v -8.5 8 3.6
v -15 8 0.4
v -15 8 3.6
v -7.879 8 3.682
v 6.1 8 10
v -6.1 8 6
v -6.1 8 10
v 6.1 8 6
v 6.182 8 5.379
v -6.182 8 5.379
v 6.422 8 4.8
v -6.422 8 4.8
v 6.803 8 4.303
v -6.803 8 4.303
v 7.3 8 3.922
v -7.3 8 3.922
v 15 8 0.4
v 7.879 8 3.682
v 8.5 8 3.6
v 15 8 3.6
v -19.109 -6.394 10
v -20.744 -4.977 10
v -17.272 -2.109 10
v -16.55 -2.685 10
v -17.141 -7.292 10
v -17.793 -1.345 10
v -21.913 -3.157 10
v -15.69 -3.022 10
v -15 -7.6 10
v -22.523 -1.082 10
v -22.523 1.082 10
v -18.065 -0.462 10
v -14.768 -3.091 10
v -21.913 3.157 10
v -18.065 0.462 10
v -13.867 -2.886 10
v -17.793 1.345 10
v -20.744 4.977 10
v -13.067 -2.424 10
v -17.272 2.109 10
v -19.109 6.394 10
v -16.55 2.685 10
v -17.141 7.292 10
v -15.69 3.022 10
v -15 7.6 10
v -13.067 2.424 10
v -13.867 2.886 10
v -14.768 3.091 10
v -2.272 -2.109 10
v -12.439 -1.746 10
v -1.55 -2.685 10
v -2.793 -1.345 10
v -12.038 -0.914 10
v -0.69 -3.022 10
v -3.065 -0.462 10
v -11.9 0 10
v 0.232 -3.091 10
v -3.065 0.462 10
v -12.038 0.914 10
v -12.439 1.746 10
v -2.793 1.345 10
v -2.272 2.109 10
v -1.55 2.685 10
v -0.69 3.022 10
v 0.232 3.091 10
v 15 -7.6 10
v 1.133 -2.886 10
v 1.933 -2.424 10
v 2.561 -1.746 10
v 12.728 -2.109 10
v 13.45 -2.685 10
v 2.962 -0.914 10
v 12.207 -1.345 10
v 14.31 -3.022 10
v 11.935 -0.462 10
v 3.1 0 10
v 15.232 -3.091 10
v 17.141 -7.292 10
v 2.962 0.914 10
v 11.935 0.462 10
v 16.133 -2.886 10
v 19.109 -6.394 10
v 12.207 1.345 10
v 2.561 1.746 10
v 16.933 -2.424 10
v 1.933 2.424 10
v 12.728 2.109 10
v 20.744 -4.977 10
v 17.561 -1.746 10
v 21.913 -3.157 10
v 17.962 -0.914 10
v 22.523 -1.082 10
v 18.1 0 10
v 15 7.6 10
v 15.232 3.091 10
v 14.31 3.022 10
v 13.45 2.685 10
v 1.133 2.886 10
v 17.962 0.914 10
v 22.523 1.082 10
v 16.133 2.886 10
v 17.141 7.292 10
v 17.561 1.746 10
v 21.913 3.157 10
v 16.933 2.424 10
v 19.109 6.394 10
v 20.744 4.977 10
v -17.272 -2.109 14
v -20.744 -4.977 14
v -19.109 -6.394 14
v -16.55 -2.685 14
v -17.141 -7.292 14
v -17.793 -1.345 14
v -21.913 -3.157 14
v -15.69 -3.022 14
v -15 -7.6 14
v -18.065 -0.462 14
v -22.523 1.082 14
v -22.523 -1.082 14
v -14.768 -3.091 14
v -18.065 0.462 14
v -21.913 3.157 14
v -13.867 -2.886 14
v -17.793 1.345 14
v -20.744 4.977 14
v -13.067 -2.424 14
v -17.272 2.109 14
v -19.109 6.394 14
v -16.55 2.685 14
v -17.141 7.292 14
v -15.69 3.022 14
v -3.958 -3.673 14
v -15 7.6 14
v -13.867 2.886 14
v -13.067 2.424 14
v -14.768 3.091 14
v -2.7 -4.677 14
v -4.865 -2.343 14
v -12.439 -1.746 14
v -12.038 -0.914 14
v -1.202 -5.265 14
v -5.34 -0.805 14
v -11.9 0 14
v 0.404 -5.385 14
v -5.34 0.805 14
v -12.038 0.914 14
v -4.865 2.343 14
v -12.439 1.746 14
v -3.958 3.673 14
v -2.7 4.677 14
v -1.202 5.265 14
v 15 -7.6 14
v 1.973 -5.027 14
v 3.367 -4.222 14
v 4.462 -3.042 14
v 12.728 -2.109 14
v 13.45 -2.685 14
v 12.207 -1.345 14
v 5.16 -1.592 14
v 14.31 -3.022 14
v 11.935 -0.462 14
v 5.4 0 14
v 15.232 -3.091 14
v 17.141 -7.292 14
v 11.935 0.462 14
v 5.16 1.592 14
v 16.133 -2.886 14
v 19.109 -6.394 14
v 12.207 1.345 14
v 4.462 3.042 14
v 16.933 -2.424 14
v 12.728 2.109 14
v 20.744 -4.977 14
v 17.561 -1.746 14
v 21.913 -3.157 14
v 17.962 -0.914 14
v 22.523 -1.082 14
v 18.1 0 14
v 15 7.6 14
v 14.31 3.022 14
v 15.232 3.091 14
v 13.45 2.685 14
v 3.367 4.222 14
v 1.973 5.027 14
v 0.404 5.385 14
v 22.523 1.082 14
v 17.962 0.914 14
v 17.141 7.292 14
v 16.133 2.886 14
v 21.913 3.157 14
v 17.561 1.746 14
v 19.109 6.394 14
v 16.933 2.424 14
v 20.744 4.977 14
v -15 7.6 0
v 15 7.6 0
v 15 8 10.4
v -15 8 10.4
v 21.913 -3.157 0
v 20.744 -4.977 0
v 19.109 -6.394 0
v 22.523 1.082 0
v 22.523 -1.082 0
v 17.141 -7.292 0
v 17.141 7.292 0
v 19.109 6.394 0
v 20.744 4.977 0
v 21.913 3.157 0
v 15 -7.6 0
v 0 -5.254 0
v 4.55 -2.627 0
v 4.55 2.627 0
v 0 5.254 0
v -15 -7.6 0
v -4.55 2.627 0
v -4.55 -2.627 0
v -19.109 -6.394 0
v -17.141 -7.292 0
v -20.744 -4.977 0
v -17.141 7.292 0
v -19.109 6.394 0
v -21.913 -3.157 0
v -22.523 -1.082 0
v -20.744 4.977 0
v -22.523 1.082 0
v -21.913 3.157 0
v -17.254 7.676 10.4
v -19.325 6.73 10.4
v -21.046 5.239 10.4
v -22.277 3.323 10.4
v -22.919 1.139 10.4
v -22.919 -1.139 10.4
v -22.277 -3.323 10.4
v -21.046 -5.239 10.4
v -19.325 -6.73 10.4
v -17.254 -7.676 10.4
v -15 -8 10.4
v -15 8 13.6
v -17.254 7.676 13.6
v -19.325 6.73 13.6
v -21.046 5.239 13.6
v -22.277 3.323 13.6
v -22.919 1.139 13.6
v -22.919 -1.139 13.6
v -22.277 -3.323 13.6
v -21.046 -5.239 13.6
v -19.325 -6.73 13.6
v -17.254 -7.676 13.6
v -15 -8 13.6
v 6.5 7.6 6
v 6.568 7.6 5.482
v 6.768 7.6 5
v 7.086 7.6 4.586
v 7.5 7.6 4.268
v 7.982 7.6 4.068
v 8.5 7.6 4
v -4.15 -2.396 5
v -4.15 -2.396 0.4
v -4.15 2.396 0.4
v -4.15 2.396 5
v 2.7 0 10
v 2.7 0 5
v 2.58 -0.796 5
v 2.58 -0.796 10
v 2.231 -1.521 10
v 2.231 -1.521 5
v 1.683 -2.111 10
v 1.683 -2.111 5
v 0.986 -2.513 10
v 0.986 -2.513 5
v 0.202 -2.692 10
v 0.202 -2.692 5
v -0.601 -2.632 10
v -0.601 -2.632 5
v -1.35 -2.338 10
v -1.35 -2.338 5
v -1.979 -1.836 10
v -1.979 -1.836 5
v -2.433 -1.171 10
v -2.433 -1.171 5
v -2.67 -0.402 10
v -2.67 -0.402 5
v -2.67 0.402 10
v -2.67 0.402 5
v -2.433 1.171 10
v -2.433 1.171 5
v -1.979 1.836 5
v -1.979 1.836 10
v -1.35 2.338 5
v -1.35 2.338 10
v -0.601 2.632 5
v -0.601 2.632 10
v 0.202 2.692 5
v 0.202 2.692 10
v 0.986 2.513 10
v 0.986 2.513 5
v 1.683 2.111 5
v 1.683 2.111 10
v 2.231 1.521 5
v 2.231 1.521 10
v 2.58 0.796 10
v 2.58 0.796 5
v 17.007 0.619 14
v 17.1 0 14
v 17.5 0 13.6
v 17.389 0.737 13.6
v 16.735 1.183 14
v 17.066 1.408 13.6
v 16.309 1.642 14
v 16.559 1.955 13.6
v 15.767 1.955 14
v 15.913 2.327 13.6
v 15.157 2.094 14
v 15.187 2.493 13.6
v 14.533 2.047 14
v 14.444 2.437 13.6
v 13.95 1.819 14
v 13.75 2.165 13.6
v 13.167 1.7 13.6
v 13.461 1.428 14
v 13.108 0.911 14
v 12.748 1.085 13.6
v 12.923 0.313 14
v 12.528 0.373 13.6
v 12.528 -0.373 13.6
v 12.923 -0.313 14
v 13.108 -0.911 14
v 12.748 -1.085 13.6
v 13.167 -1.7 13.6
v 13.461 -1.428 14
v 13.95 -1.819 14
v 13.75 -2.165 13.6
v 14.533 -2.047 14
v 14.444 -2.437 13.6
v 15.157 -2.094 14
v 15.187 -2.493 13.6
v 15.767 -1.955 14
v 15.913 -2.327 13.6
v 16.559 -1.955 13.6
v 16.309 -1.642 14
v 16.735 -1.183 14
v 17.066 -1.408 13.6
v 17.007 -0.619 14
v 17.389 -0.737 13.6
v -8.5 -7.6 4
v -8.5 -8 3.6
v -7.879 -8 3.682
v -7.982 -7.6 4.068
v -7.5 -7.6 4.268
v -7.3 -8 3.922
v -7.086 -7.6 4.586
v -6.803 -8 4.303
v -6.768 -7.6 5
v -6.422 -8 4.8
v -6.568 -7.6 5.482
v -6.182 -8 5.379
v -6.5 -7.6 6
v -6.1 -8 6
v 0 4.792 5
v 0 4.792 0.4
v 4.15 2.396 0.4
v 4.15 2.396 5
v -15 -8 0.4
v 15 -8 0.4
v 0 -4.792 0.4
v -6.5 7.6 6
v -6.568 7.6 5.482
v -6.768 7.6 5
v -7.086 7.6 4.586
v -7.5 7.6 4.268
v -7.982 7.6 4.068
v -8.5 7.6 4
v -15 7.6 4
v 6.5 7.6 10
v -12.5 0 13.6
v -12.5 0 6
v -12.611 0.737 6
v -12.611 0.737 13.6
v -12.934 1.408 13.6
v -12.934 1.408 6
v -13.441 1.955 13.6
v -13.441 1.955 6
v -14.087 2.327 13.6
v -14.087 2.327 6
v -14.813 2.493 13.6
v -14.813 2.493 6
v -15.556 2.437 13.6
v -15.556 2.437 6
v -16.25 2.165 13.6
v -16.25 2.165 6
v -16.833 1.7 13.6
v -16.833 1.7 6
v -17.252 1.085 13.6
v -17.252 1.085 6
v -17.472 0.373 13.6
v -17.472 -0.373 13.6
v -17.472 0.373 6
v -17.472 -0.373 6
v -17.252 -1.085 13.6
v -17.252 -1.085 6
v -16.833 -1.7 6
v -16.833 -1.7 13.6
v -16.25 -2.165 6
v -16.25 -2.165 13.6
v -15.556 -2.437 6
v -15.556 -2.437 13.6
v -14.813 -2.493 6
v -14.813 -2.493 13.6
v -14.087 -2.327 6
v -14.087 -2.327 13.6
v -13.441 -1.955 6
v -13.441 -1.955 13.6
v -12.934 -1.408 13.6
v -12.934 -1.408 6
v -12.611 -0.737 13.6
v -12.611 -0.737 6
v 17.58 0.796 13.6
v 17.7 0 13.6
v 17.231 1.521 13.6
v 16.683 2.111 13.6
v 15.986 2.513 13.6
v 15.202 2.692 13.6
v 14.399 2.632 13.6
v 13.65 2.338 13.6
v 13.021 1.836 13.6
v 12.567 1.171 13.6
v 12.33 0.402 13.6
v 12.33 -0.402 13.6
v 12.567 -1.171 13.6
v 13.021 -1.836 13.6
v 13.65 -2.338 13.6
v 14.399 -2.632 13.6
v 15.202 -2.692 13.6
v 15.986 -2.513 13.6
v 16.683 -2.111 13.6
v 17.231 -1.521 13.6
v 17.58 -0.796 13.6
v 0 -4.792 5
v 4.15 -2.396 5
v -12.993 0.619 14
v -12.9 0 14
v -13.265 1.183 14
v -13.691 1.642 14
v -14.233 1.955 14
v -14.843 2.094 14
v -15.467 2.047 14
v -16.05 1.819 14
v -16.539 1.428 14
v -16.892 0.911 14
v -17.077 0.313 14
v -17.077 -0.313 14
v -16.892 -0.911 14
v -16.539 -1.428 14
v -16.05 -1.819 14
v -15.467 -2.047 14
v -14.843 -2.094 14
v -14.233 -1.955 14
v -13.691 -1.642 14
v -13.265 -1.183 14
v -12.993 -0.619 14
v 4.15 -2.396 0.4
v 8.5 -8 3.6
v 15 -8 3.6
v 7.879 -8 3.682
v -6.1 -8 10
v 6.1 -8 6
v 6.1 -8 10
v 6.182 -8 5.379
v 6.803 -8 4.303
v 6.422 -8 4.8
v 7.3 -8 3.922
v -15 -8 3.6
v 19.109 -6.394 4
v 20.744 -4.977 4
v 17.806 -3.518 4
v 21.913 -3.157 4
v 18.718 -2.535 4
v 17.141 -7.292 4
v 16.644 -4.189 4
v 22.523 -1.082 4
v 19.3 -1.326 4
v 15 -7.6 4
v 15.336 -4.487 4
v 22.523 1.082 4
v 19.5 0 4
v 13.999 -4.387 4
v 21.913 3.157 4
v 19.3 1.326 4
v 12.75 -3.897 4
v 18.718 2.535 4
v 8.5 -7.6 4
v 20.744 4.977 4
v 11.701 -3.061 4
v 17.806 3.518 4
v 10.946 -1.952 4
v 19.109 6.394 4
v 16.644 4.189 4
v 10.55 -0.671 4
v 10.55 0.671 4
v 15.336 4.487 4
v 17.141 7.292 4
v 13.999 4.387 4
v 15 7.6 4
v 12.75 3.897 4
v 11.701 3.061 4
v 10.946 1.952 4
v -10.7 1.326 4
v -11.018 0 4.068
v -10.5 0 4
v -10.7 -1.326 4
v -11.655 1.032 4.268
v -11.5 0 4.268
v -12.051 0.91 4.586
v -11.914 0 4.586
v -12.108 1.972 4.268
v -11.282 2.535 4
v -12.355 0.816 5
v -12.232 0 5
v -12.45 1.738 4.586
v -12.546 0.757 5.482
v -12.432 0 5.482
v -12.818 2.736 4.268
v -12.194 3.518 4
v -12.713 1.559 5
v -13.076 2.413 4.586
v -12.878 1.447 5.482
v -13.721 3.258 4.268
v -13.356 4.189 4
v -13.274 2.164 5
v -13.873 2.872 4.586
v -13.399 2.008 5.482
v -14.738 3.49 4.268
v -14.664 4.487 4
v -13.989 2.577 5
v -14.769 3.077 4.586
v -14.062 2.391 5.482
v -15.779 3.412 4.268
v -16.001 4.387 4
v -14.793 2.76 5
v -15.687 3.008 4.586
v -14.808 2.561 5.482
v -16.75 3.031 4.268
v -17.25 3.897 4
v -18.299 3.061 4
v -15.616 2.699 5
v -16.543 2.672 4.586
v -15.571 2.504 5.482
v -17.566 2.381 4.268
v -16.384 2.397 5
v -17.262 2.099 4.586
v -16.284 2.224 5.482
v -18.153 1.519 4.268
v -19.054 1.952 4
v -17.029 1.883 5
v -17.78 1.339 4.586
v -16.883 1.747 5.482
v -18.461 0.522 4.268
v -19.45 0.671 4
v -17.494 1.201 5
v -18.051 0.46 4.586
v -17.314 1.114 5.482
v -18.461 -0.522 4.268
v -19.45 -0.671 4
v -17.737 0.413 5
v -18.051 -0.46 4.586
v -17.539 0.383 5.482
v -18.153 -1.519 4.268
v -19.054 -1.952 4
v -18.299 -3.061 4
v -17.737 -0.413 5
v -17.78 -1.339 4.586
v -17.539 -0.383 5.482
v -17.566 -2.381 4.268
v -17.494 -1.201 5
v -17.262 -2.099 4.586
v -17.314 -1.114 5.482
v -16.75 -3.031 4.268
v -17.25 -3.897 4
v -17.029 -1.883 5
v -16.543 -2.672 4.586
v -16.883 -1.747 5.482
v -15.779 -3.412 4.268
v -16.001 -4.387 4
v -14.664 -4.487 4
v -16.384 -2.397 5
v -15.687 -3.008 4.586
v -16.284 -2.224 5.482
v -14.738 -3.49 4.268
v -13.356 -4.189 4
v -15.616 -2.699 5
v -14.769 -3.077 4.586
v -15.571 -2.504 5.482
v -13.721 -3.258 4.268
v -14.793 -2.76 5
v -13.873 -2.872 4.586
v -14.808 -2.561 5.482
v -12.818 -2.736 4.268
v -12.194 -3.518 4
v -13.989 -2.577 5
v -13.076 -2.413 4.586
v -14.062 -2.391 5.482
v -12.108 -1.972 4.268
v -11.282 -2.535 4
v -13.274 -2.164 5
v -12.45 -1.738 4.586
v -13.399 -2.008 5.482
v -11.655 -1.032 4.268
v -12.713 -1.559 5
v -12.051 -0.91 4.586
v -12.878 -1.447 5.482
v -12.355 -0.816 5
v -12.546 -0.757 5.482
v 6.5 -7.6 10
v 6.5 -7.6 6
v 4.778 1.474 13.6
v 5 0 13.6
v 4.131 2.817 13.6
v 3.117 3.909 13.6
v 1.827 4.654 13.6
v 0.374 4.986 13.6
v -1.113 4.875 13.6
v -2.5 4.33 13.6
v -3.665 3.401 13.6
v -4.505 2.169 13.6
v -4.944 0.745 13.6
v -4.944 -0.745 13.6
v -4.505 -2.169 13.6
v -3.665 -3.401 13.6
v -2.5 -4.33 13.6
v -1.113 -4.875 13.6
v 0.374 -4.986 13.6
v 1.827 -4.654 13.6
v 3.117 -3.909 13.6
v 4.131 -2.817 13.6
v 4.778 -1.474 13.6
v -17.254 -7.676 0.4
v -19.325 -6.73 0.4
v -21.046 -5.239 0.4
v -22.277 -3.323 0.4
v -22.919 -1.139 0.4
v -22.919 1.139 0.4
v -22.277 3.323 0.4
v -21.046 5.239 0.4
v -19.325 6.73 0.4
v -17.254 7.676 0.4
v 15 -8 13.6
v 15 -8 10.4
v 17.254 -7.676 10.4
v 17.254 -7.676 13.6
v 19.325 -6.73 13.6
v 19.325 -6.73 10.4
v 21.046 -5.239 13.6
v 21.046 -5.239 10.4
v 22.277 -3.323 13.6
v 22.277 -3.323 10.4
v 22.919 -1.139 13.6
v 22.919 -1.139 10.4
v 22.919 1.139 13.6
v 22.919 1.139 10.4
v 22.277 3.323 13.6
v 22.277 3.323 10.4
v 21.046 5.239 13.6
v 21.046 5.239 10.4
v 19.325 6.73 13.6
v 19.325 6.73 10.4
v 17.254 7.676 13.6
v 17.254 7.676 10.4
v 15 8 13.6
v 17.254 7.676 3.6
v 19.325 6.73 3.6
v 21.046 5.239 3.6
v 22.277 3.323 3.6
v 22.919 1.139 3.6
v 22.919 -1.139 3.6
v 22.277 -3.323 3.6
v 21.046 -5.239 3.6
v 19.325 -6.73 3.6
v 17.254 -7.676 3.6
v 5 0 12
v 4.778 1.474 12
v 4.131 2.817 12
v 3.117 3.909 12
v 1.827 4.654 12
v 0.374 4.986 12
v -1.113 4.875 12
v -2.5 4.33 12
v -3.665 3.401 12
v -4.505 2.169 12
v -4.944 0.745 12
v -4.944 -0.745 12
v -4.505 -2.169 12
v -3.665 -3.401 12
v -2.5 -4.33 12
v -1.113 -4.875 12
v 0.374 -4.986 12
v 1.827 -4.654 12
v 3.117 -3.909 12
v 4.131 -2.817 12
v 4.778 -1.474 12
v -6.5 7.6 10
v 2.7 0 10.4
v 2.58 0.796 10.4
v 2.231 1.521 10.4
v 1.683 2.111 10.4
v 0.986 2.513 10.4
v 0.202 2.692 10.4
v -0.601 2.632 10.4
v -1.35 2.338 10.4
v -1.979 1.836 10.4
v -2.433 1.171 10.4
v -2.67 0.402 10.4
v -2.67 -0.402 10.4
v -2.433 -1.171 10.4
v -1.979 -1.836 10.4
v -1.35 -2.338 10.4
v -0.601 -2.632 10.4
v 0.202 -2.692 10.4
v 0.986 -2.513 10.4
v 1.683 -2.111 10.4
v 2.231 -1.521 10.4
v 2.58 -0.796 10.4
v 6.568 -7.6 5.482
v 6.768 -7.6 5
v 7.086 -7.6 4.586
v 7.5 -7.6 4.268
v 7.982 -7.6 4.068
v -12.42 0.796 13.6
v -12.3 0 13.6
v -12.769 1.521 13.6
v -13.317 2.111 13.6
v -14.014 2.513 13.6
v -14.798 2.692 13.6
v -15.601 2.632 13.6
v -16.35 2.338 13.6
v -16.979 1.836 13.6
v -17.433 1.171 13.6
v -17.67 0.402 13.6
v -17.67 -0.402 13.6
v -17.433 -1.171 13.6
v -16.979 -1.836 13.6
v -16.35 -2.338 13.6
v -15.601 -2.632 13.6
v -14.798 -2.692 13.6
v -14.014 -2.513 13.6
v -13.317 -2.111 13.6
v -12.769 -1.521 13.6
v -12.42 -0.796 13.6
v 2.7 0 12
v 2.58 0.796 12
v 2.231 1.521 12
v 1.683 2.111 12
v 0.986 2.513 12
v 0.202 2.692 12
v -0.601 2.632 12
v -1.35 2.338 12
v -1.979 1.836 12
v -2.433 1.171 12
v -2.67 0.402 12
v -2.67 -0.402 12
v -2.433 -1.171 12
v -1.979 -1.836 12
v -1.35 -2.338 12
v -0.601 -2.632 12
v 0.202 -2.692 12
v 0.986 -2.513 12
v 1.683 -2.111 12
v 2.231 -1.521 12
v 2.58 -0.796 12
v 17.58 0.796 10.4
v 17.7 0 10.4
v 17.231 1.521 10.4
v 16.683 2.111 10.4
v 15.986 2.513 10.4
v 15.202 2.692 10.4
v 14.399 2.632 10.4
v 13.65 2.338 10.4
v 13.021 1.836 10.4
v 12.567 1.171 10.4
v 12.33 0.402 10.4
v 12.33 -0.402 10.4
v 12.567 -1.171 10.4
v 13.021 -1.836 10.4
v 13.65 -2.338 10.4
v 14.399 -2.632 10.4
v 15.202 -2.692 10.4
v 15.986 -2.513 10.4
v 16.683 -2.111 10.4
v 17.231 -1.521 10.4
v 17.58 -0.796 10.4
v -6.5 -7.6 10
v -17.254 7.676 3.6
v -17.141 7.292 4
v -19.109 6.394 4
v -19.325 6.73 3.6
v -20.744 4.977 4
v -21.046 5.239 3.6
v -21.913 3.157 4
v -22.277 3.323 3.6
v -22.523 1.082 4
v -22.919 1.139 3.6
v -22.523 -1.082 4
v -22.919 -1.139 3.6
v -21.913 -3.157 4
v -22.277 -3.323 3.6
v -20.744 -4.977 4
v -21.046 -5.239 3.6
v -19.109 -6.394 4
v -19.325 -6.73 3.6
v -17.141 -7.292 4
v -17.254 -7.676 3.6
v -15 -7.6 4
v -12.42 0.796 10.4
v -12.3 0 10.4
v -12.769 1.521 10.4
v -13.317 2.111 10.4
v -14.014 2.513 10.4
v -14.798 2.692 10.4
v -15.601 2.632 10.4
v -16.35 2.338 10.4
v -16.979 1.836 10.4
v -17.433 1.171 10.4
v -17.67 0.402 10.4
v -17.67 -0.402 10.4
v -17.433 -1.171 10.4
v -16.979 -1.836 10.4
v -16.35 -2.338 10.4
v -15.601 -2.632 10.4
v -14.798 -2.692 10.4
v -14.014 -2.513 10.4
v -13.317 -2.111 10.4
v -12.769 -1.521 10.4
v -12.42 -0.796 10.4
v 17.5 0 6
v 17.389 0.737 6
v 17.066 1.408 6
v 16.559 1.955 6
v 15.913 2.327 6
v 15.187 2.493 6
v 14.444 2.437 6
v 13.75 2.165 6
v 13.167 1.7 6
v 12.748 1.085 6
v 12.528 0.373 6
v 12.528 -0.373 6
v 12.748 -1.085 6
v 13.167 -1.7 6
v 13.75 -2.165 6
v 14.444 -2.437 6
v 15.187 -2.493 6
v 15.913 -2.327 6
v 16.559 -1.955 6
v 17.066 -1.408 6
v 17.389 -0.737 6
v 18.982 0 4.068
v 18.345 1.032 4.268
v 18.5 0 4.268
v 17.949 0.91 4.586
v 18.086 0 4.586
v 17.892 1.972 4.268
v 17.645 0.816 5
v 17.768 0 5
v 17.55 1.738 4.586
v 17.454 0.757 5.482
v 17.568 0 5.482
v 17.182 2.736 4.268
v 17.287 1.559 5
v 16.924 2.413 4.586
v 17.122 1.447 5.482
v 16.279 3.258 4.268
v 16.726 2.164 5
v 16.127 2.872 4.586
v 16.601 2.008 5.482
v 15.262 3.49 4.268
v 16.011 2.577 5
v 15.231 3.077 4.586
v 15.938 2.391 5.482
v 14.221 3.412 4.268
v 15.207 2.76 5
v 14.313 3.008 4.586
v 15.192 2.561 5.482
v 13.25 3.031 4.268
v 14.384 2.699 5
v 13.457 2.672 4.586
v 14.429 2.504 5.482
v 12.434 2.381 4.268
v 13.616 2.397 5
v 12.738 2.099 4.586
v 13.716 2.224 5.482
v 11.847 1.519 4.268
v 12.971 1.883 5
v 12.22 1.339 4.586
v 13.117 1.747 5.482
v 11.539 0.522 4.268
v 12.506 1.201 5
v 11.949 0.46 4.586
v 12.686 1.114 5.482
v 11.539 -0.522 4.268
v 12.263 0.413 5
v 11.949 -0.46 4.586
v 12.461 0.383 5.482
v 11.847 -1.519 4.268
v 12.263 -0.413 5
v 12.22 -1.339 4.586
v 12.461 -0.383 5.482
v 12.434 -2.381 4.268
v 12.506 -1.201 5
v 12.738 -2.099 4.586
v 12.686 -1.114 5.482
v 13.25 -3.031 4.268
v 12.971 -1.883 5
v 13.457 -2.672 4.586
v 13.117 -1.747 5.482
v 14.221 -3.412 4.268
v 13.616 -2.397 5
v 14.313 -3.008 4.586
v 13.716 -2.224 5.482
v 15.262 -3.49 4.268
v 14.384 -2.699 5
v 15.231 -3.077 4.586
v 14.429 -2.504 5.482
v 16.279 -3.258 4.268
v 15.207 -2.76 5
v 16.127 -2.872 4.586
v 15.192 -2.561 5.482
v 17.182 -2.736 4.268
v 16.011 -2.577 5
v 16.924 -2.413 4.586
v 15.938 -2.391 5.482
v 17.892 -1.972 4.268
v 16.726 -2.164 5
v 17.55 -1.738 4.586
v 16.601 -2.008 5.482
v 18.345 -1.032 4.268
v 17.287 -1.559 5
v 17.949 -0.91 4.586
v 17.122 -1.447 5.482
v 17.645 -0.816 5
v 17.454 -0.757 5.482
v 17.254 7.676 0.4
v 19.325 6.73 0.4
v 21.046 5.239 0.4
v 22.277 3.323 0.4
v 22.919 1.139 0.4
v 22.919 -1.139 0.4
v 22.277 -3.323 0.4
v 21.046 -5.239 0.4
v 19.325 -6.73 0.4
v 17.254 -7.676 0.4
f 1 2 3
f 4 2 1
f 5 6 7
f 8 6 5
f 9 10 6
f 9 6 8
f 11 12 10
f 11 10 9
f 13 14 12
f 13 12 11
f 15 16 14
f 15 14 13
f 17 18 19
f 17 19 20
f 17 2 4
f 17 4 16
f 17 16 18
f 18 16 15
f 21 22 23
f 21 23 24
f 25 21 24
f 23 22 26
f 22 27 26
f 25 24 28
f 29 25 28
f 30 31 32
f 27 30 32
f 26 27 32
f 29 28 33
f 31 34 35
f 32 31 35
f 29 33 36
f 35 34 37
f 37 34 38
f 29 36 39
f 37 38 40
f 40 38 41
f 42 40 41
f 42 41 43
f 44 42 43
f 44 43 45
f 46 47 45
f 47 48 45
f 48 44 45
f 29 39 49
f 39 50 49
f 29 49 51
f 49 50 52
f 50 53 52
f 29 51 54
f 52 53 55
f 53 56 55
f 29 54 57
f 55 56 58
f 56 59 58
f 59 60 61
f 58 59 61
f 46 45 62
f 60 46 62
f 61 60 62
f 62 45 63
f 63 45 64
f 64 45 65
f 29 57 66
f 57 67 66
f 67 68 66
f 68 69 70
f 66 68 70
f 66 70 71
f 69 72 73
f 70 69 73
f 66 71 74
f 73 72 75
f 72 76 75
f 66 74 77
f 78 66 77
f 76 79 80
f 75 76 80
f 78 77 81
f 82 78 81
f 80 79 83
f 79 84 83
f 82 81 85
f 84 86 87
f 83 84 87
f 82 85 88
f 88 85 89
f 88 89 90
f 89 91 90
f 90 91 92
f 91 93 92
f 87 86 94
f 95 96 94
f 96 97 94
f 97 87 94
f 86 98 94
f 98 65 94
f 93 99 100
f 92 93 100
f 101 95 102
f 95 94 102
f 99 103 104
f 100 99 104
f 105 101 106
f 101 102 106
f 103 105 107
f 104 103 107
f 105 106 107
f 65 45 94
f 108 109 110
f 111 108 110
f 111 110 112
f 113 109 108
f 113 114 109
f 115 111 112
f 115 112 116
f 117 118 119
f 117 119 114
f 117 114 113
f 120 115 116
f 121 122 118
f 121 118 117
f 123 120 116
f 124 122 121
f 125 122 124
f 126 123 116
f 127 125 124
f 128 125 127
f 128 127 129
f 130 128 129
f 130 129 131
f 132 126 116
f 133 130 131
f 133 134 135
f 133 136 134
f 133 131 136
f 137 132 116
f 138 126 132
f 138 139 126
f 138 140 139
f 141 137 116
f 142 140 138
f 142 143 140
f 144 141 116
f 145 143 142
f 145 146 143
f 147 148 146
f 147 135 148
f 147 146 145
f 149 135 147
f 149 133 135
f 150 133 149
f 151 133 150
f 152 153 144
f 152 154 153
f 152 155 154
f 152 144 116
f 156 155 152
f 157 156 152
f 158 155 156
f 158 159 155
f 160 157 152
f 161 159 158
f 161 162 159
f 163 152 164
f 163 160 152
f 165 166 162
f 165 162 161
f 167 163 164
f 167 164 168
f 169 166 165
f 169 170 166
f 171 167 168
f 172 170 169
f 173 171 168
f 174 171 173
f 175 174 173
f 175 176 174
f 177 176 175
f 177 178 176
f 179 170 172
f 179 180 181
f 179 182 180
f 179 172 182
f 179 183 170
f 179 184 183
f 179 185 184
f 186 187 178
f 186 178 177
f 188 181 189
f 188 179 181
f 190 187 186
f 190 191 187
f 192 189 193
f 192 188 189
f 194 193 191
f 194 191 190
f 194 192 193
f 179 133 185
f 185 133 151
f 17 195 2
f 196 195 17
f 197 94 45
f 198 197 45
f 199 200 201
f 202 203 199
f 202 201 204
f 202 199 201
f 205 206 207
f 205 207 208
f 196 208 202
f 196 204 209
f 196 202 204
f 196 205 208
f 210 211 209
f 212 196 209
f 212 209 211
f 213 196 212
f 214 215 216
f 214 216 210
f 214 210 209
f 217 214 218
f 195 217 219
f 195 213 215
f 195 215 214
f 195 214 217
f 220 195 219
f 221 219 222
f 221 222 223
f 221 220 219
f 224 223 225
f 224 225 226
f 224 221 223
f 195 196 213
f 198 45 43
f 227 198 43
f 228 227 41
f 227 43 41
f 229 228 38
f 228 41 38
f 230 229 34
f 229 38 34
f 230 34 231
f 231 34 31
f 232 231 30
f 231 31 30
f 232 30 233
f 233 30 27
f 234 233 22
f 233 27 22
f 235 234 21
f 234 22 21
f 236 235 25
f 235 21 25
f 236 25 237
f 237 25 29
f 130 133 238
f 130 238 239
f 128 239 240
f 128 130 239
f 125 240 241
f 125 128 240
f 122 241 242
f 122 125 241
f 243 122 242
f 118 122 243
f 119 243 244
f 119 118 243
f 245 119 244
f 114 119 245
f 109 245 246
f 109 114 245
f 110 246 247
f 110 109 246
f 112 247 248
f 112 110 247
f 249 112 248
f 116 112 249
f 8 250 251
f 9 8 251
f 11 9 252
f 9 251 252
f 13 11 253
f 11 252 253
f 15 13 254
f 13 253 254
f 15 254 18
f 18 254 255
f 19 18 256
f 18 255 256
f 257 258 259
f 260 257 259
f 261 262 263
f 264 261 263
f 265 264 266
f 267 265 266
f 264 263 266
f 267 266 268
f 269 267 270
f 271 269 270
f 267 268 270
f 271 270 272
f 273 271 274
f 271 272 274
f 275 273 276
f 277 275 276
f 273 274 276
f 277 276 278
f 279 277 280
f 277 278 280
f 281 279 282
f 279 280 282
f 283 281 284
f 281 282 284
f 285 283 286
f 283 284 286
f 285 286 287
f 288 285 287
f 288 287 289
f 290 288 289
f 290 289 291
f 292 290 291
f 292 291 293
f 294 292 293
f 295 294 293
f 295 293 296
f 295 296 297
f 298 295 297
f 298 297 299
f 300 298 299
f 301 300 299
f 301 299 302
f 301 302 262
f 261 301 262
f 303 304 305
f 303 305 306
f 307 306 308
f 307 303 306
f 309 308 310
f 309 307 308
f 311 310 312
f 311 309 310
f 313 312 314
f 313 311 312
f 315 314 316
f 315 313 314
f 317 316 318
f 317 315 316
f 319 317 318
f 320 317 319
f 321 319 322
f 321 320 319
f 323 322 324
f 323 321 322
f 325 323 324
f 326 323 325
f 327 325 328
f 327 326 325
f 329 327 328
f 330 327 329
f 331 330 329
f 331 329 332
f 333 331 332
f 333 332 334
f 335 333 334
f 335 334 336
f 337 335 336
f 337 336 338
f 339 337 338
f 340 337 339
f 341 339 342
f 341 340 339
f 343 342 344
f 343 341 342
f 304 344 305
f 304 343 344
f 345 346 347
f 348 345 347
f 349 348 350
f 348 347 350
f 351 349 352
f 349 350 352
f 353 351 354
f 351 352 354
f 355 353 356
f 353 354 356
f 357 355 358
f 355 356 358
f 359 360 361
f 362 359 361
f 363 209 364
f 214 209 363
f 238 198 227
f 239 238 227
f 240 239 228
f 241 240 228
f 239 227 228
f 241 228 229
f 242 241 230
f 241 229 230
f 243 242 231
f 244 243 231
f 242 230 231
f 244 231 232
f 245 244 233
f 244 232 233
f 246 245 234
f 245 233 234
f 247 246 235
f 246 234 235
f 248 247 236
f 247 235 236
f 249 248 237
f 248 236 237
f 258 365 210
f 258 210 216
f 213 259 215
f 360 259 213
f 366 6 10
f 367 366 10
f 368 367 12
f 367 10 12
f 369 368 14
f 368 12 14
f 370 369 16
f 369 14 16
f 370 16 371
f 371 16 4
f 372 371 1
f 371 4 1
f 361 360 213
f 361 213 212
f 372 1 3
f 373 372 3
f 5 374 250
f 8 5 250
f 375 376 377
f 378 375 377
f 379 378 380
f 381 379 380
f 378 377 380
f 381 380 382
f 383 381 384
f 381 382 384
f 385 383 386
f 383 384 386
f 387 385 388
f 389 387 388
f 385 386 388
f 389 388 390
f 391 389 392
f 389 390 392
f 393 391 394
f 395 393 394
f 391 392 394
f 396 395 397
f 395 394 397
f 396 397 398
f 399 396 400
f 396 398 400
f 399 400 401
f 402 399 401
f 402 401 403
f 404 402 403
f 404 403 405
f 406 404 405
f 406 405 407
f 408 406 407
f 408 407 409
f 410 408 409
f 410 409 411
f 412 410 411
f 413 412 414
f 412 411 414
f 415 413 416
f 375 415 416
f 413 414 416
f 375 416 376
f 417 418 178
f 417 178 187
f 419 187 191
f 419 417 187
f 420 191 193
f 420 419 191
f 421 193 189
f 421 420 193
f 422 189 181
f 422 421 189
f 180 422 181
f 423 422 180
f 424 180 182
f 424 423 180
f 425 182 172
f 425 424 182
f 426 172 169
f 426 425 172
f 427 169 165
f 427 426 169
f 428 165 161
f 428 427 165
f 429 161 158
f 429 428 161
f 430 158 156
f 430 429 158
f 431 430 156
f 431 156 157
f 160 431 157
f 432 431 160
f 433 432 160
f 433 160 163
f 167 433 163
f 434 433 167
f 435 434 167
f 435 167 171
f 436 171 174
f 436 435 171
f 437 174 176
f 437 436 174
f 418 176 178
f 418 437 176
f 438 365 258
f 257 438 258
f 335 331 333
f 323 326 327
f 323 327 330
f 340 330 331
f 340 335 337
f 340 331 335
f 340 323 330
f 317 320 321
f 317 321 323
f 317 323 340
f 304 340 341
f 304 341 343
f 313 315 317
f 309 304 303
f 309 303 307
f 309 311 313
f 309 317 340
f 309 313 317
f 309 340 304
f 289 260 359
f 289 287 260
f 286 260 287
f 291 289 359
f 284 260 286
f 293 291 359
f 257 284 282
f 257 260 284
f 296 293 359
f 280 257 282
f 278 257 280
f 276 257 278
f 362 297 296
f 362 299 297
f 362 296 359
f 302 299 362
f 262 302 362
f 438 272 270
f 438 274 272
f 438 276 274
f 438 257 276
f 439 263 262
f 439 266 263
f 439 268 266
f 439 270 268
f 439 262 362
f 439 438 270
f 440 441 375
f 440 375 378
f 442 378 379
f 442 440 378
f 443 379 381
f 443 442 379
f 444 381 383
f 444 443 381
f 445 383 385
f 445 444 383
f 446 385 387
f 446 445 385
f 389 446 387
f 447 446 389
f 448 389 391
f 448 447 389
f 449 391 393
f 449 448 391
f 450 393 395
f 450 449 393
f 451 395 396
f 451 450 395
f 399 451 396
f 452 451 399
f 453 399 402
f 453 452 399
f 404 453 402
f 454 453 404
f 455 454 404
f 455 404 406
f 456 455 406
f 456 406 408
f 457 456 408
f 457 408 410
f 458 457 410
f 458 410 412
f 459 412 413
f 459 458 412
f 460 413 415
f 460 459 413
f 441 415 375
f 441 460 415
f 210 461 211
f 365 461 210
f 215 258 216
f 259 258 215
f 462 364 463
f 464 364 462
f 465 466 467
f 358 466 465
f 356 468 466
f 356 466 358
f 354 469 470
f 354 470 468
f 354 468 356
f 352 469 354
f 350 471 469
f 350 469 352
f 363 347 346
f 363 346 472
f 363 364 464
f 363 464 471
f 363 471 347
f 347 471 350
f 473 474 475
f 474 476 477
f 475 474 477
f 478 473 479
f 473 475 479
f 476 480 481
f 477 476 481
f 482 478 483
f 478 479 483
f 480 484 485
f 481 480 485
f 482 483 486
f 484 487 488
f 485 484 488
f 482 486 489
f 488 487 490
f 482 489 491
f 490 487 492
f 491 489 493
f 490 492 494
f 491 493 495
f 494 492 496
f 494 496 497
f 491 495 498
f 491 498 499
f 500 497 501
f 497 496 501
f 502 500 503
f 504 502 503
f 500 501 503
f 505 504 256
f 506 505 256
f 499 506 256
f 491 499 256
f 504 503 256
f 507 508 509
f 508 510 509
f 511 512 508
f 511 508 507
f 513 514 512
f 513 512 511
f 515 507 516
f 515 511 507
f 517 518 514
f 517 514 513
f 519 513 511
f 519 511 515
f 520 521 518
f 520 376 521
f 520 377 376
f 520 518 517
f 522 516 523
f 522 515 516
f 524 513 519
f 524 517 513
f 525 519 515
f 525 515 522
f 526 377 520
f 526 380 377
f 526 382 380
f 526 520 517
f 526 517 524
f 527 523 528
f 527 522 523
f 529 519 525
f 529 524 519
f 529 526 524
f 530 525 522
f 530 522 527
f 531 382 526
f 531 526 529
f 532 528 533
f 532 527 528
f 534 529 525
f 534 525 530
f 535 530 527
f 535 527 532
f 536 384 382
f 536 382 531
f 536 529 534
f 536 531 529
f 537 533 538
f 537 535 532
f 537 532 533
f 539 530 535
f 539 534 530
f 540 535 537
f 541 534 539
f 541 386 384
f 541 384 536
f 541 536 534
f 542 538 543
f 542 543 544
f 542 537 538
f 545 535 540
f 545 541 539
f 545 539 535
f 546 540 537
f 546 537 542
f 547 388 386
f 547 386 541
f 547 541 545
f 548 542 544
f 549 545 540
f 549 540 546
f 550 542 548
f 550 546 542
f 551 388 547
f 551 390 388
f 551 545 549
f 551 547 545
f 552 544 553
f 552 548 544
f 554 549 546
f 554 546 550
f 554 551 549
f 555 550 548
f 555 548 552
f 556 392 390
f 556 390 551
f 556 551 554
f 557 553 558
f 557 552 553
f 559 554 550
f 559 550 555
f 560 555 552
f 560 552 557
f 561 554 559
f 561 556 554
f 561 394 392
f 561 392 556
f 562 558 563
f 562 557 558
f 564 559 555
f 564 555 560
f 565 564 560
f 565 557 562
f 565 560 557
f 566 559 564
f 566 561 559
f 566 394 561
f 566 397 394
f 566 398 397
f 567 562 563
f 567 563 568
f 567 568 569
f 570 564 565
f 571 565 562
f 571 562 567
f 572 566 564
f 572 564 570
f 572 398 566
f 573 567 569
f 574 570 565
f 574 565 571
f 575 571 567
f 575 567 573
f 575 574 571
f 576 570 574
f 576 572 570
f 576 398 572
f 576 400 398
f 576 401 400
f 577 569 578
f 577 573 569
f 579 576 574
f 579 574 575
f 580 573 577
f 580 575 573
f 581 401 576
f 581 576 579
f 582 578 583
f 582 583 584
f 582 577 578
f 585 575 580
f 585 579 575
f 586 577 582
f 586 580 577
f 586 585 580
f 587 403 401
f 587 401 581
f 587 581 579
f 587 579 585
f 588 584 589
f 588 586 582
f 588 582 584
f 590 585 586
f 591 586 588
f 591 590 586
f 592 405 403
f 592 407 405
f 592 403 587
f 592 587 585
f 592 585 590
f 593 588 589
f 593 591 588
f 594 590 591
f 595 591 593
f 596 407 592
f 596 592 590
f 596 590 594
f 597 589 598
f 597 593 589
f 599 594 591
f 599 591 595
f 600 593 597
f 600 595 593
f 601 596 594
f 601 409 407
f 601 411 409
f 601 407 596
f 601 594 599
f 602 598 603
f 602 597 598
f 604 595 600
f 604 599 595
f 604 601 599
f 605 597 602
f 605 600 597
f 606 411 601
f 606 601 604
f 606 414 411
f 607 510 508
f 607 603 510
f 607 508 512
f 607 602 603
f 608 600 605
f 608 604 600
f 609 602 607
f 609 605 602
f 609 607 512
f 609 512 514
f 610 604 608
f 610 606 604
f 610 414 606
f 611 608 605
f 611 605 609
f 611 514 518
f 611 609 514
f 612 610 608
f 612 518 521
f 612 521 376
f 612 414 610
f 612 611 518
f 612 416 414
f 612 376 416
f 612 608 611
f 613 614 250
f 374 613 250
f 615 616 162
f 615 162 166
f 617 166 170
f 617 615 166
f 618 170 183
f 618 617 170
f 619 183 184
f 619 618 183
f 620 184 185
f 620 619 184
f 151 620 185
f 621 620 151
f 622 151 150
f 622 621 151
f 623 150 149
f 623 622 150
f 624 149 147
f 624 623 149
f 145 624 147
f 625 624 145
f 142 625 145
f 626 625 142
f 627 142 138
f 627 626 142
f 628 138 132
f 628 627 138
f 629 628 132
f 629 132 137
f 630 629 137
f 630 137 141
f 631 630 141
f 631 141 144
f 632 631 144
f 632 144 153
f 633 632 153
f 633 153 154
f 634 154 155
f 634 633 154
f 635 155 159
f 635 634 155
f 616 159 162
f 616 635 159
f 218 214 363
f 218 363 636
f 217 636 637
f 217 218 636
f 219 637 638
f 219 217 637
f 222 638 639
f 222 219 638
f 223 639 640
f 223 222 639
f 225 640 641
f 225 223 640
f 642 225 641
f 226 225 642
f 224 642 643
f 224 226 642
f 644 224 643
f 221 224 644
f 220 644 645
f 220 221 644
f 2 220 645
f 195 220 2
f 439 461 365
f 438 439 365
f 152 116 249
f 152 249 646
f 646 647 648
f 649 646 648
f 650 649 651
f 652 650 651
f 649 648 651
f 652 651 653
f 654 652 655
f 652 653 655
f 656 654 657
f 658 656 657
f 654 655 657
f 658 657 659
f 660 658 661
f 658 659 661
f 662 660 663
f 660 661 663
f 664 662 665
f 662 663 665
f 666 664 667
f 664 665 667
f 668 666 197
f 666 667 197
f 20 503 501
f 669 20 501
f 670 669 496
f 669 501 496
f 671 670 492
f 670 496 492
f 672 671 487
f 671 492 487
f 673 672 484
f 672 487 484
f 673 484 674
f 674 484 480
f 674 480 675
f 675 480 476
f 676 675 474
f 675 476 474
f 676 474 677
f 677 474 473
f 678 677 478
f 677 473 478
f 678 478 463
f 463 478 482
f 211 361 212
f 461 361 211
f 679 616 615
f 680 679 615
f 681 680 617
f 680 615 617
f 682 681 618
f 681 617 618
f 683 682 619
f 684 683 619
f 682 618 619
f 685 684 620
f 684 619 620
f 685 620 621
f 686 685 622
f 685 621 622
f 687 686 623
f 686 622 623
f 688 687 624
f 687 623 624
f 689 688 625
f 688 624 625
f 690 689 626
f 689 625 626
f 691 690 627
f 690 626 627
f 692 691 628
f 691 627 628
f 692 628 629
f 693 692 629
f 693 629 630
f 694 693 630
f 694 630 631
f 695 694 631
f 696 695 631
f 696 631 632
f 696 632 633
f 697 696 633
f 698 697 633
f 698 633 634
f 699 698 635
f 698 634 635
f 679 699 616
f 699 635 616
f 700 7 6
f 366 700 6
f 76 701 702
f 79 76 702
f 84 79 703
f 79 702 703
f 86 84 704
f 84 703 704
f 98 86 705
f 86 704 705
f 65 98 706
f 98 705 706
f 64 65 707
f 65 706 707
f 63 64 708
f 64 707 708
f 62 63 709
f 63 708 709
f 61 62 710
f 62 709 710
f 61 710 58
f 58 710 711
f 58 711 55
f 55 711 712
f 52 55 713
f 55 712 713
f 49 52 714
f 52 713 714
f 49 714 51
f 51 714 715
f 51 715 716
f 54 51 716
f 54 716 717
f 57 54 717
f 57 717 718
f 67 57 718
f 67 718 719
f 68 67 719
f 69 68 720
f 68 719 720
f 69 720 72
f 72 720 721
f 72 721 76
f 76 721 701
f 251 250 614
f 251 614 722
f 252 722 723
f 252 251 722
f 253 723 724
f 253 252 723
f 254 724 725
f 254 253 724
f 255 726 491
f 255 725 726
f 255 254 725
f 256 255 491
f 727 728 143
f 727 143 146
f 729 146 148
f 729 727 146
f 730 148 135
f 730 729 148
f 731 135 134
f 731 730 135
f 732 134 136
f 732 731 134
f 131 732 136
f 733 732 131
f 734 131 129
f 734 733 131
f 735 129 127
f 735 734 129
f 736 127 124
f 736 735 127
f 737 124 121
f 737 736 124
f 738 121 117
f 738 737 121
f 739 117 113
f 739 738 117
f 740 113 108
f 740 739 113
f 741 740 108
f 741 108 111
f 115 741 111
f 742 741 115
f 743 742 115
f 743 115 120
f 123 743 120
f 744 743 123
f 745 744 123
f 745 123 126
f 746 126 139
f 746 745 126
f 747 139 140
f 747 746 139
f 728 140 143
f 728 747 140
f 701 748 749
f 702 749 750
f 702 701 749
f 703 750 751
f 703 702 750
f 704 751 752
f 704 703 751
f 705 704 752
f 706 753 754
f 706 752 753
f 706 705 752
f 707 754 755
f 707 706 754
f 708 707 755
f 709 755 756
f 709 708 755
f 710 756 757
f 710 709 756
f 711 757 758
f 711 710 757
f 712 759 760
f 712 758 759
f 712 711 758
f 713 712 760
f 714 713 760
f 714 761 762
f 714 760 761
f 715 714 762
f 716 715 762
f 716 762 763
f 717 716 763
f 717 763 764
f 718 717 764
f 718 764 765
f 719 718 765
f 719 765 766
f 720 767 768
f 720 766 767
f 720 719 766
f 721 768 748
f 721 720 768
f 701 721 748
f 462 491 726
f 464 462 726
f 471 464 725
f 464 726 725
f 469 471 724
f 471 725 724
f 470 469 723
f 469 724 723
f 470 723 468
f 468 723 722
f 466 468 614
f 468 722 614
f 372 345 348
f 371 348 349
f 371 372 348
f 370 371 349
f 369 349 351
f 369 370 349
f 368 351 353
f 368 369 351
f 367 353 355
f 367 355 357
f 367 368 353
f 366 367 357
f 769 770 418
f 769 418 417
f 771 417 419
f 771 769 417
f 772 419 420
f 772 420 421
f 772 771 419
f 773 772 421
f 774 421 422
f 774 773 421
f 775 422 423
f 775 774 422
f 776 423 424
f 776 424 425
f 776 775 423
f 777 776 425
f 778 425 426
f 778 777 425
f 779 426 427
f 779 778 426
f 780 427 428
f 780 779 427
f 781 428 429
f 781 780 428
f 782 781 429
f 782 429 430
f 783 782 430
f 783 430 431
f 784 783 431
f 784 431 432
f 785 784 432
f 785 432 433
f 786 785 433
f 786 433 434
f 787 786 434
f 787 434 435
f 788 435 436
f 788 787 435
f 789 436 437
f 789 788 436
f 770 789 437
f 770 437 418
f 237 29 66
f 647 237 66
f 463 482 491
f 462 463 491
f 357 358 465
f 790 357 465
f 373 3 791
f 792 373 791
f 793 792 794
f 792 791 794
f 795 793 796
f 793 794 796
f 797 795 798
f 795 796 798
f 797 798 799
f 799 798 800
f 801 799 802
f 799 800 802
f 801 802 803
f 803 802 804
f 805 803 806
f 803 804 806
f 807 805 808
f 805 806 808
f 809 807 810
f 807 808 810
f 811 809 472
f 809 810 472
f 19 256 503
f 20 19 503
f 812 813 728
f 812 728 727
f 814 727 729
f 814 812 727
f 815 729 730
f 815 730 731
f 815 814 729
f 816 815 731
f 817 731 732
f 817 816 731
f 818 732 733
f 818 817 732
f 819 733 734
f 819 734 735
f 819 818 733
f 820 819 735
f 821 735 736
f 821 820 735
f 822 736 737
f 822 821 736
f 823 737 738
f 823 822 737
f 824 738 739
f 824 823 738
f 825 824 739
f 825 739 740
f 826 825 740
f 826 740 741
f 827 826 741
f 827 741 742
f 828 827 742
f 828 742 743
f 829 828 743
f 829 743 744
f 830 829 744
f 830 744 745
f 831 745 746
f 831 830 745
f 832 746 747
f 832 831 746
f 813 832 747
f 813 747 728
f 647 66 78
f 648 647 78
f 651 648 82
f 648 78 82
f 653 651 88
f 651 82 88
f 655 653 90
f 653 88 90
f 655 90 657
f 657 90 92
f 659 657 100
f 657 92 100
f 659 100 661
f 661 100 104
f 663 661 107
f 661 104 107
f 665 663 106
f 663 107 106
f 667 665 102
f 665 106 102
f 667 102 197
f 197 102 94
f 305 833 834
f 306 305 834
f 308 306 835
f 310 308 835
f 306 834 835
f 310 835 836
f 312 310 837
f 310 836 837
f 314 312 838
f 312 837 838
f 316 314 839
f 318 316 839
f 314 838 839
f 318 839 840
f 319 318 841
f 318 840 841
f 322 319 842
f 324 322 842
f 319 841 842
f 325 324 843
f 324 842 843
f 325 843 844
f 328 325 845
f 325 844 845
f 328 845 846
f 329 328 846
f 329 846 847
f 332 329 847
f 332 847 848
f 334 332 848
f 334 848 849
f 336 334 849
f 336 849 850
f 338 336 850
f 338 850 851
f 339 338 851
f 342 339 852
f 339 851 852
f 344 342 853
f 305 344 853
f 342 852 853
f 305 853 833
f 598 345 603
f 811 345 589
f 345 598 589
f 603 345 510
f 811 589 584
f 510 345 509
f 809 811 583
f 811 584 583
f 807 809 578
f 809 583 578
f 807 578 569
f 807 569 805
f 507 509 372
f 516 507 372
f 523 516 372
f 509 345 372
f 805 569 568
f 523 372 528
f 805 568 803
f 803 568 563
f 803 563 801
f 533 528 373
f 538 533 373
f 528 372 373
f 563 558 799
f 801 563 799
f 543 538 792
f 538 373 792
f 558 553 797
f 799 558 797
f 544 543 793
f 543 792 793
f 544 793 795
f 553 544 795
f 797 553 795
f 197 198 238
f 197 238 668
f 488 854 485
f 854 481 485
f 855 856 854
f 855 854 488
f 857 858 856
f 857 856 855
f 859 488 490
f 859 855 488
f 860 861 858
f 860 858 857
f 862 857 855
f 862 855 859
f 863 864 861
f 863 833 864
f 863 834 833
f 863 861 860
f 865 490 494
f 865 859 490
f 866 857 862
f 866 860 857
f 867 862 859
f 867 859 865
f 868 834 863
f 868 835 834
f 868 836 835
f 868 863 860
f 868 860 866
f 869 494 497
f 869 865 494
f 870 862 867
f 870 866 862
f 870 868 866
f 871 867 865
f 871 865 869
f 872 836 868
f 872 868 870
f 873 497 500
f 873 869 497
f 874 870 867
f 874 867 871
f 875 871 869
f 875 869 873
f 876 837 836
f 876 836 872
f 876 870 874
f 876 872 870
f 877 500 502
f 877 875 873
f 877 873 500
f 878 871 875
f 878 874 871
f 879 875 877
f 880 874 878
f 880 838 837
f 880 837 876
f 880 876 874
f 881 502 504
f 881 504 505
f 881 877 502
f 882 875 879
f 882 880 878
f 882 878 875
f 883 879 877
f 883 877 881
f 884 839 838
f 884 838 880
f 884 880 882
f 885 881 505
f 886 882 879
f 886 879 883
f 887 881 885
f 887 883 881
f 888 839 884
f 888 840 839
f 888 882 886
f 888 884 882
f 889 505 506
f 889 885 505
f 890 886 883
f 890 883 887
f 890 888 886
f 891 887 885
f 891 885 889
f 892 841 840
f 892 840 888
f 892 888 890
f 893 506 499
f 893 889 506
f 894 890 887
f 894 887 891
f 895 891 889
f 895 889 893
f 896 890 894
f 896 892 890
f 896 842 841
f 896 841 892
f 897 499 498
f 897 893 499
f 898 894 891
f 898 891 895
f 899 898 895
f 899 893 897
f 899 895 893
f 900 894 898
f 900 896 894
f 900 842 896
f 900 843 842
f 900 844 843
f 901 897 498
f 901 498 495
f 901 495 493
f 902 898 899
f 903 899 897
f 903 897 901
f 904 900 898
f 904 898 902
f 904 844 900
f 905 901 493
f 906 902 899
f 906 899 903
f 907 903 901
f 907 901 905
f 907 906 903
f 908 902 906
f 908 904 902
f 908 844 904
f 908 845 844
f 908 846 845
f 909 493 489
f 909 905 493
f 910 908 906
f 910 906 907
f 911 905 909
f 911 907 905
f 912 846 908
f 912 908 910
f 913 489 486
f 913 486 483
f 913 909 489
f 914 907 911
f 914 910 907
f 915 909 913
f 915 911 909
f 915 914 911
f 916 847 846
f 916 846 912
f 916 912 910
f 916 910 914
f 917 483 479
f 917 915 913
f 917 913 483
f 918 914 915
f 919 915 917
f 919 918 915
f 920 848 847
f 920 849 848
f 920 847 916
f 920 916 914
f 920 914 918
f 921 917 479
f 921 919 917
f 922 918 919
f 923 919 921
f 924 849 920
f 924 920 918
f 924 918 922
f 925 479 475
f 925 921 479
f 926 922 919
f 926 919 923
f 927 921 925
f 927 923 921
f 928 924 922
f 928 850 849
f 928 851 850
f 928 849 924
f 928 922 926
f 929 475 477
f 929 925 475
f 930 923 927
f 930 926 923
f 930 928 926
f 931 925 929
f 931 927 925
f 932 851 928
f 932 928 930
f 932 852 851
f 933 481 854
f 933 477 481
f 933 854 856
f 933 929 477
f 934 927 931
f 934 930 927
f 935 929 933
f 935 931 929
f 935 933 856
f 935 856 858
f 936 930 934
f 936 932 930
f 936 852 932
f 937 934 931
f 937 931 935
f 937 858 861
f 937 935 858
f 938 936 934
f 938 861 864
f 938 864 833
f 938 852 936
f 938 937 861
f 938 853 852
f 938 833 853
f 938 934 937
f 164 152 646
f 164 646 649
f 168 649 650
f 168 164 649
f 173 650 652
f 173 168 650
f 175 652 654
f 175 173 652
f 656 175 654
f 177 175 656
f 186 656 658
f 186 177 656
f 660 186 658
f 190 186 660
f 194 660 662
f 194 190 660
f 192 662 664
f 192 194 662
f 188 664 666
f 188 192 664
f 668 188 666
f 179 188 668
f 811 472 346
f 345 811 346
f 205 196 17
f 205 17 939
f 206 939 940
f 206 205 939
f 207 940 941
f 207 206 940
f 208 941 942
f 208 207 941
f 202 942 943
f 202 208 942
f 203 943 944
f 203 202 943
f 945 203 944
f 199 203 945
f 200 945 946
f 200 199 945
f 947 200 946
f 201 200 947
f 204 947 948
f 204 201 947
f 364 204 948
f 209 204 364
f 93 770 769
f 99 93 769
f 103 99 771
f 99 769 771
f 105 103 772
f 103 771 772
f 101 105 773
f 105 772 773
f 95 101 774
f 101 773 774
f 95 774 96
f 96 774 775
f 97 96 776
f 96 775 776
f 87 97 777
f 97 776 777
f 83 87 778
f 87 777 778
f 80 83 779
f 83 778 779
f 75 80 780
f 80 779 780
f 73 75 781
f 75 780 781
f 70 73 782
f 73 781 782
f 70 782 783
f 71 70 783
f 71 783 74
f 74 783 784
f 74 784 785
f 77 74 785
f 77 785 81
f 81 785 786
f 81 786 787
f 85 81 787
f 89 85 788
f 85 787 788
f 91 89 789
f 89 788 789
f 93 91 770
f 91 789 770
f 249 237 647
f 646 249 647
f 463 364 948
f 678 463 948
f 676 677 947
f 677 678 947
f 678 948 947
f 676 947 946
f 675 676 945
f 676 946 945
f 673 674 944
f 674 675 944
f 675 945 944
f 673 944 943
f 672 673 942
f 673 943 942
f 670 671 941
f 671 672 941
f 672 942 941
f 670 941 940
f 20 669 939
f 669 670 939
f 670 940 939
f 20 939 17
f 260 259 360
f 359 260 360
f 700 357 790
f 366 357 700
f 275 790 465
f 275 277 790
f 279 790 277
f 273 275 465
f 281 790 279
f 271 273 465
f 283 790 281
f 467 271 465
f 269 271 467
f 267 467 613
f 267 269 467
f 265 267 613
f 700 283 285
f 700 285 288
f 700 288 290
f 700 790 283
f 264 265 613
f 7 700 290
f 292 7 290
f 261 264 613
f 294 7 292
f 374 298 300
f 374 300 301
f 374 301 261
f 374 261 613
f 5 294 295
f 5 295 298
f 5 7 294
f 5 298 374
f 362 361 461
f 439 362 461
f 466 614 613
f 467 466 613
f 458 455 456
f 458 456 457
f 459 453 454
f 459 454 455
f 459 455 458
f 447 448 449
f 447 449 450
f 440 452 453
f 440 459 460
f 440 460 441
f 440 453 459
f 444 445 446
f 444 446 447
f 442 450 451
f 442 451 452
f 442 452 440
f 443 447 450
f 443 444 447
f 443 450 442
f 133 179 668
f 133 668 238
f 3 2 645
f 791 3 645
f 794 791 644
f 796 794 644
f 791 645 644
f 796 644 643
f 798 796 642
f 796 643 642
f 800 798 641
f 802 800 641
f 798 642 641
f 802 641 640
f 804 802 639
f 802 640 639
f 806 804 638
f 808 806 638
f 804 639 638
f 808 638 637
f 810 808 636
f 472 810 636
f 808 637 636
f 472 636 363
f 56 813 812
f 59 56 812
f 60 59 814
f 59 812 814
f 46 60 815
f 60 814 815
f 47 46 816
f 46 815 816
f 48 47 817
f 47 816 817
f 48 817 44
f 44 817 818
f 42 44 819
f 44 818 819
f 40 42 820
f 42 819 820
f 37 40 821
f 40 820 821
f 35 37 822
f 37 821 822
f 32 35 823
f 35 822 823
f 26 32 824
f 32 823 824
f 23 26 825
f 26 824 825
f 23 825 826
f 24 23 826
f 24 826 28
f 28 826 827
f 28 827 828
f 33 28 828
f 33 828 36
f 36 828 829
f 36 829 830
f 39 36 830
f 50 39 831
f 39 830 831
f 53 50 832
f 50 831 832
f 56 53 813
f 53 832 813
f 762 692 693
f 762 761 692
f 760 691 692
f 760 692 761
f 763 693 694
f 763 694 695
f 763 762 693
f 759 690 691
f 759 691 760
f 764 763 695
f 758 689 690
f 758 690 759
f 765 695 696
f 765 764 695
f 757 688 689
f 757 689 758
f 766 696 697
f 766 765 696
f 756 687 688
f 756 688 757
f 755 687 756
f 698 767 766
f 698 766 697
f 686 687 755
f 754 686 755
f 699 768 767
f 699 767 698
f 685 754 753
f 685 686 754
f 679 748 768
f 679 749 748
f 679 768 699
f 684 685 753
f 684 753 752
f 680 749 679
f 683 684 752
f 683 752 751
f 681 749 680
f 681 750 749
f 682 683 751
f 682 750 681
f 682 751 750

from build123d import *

# Parameters (mm, degrees)
PAD_DEPTH       = 4
SKETCH001_W     = 13
SKETCH001_H     = 16
PAD001_DEPTH    = 6
SKETCH002_R     = 2.5
PAD002_DEPTH    = 10
SKETCH003_R     = 2.7
POCKET_DEPTH    = 14.001
POCKET001_DEPTH = 5
FILLET_R        = 2
CHAMFER_SIZE    = 0.4
SKETCH005_R     = 2.7
PAD003_DEPTH    = 4
SKETCH006_R     = 5
POCKET002_DEPTH = 2
CHAMFER001_SIZE = 0.4


with BuildPart() as bottom:
    # Sketch → Pad (new body)
    with BuildSketch(Plane.XY):
        with BuildLine():
            Line((-14.999974, 8), (14.999974, 8))
            ThreePointArc((14.999974, -8), (23, 0), (14.999974, 8))
            Line((14.999974, -8), (-14.999974, -8))
            ThreePointArc((-14.999974, 8), (-23, 0), (-14.999974, -8))
        make_face()
    extrude(amount=PAD_DEPTH)

    # Sketch001 → Pad001 (join)
    with BuildSketch(Plane.XY.offset(4)):
        Rectangle(SKETCH001_W, SKETCH001_H)
    extrude(amount=PAD001_DEPTH)

    # Sketch002 → Pad002 (join)
    with BuildSketch(Plane.XY.offset(4)):
        with Locations((-15, 0)):
            Circle(SKETCH002_R)
        with Locations((15, 0)):
            Circle(SKETCH002_R)
    extrude(amount=PAD002_DEPTH)

    # Sketch003 → Pocket (cut, through all)
    with BuildSketch(Plane(origin=(0, 0, 0), x_dir=(1, 0, 0), z_dir=(0, 0, -1))):
        Circle(SKETCH003_R)
    extrude(amount=-POCKET_DEPTH, mode=Mode.SUBTRACT)

    # Sketch004 → Pocket001 (cut)
    with BuildSketch(Plane(origin=(0, 0, 0), x_dir=(1, 0, 0), z_dir=(0, 0, -1))):
        Polygon((0, 4.792007), (-4.15, 2.396004), (-4.15, -2.396004), (0, -4.792007), (4.15, -2.396004), (4.15, 2.396004), align=None)
    extrude(amount=-POCKET001_DEPTH, mode=Mode.SUBTRACT)

    # Fillet
    fillet_edges = [bottom.edges().sort_by_distance(p)[0] for p in [
        (12.5, 0, 4),
        (6.5, 0, 4),
        (-6.5, 0, 4),
        (-17.5, 0, 4),
    ]]
    fillet(fillet_edges, radius=FILLET_R)

    # Chamfer
    chamfer_edges = [bottom.edges().sort_by_distance(p)[0] for p in [
        (-6.5, -8, 8),
        (-7.085786, -8, 4.585786),
        (-11.749987, -8, 4),
        (-23, 0, 4),
        (-11.749987, 8, 4),
        (-7.085786, 8, 4.585786),
        (-6.5, 8, 8),
        (7.085786, 8, 4.585786),
        (6.5, 8, 8),
        (11.749987, 8, 4),
        (23, 0, 4),
        (11.749987, -8, 4),
        (7.085786, -8, 4.585786),
        (6.5, -8, 8),
        (0, 8, 0),
        (-23, 0, 0),
        (0, -8, 0),
        (23, 0, 0),
        (12.5, 0, 14),
        (-17.5, 0, 14),
        (2.075, 3.594005, 0),
        (-2.075, -3.594005, 0),
        (-4.15, 0, 0),
        (-2.075, 3.594005, 0),
        (4.15, 0, 0),
        (2.075, -3.594005, 0),
    ]]
    chamfer(chamfer_edges, length=CHAMFER_SIZE)


with BuildPart() as top:
    # Sketch005 → Pad003 (new body)
    with BuildSketch(Plane.XY):
        with BuildLine():
            ThreePointArc((-15, 8), (-23, 0), (-15, -8))
            Line((-15, -8), (15, -8))
            ThreePointArc((15, -8), (23, 0), (15, 8))
            Line((-15, 8), (15, 8))
        make_face()
        with Locations((-15, 0)):
            Circle(SKETCH005_R, mode=Mode.SUBTRACT)
        with Locations((15, 0)):
            Circle(SKETCH005_R, mode=Mode.SUBTRACT)
        Circle(SKETCH005_R, mode=Mode.SUBTRACT)
    extrude(amount=PAD003_DEPTH)

    # Sketch006 → Pocket002 (cut)
    with BuildSketch(Plane.XY.offset(4)):
        Circle(SKETCH006_R)
    extrude(amount=-POCKET002_DEPTH, mode=Mode.SUBTRACT)

    # Chamfer001
    chamfer001_edges = [top.edges().sort_by_distance(p)[0] for p in [
        (-23, 0, 4),
        (0, 8, 4),
        (0, -8, 4),
        (23, 0, 4),
        (12.3, 0, 4),
        (-5, 0, 4),
        (-17.7, 0, 4),
        (-23, 0, 0),
        (0, -8, 0),
        (23, 0, 0),
        (0, 8, 0),
        (12.3, 0, 0),
        (-2.7, 0, 0),
        (-17.7, 0, 0),
    ]]
    chamfer(chamfer001_edges, length=CHAMFER001_SIZE)


with BuildPart() as top_1:
    # Body002 placement: moved
    add(top.part.moved(Location((0, 0, 10))))


solid = Compound([bottom.part, top_1.part])
